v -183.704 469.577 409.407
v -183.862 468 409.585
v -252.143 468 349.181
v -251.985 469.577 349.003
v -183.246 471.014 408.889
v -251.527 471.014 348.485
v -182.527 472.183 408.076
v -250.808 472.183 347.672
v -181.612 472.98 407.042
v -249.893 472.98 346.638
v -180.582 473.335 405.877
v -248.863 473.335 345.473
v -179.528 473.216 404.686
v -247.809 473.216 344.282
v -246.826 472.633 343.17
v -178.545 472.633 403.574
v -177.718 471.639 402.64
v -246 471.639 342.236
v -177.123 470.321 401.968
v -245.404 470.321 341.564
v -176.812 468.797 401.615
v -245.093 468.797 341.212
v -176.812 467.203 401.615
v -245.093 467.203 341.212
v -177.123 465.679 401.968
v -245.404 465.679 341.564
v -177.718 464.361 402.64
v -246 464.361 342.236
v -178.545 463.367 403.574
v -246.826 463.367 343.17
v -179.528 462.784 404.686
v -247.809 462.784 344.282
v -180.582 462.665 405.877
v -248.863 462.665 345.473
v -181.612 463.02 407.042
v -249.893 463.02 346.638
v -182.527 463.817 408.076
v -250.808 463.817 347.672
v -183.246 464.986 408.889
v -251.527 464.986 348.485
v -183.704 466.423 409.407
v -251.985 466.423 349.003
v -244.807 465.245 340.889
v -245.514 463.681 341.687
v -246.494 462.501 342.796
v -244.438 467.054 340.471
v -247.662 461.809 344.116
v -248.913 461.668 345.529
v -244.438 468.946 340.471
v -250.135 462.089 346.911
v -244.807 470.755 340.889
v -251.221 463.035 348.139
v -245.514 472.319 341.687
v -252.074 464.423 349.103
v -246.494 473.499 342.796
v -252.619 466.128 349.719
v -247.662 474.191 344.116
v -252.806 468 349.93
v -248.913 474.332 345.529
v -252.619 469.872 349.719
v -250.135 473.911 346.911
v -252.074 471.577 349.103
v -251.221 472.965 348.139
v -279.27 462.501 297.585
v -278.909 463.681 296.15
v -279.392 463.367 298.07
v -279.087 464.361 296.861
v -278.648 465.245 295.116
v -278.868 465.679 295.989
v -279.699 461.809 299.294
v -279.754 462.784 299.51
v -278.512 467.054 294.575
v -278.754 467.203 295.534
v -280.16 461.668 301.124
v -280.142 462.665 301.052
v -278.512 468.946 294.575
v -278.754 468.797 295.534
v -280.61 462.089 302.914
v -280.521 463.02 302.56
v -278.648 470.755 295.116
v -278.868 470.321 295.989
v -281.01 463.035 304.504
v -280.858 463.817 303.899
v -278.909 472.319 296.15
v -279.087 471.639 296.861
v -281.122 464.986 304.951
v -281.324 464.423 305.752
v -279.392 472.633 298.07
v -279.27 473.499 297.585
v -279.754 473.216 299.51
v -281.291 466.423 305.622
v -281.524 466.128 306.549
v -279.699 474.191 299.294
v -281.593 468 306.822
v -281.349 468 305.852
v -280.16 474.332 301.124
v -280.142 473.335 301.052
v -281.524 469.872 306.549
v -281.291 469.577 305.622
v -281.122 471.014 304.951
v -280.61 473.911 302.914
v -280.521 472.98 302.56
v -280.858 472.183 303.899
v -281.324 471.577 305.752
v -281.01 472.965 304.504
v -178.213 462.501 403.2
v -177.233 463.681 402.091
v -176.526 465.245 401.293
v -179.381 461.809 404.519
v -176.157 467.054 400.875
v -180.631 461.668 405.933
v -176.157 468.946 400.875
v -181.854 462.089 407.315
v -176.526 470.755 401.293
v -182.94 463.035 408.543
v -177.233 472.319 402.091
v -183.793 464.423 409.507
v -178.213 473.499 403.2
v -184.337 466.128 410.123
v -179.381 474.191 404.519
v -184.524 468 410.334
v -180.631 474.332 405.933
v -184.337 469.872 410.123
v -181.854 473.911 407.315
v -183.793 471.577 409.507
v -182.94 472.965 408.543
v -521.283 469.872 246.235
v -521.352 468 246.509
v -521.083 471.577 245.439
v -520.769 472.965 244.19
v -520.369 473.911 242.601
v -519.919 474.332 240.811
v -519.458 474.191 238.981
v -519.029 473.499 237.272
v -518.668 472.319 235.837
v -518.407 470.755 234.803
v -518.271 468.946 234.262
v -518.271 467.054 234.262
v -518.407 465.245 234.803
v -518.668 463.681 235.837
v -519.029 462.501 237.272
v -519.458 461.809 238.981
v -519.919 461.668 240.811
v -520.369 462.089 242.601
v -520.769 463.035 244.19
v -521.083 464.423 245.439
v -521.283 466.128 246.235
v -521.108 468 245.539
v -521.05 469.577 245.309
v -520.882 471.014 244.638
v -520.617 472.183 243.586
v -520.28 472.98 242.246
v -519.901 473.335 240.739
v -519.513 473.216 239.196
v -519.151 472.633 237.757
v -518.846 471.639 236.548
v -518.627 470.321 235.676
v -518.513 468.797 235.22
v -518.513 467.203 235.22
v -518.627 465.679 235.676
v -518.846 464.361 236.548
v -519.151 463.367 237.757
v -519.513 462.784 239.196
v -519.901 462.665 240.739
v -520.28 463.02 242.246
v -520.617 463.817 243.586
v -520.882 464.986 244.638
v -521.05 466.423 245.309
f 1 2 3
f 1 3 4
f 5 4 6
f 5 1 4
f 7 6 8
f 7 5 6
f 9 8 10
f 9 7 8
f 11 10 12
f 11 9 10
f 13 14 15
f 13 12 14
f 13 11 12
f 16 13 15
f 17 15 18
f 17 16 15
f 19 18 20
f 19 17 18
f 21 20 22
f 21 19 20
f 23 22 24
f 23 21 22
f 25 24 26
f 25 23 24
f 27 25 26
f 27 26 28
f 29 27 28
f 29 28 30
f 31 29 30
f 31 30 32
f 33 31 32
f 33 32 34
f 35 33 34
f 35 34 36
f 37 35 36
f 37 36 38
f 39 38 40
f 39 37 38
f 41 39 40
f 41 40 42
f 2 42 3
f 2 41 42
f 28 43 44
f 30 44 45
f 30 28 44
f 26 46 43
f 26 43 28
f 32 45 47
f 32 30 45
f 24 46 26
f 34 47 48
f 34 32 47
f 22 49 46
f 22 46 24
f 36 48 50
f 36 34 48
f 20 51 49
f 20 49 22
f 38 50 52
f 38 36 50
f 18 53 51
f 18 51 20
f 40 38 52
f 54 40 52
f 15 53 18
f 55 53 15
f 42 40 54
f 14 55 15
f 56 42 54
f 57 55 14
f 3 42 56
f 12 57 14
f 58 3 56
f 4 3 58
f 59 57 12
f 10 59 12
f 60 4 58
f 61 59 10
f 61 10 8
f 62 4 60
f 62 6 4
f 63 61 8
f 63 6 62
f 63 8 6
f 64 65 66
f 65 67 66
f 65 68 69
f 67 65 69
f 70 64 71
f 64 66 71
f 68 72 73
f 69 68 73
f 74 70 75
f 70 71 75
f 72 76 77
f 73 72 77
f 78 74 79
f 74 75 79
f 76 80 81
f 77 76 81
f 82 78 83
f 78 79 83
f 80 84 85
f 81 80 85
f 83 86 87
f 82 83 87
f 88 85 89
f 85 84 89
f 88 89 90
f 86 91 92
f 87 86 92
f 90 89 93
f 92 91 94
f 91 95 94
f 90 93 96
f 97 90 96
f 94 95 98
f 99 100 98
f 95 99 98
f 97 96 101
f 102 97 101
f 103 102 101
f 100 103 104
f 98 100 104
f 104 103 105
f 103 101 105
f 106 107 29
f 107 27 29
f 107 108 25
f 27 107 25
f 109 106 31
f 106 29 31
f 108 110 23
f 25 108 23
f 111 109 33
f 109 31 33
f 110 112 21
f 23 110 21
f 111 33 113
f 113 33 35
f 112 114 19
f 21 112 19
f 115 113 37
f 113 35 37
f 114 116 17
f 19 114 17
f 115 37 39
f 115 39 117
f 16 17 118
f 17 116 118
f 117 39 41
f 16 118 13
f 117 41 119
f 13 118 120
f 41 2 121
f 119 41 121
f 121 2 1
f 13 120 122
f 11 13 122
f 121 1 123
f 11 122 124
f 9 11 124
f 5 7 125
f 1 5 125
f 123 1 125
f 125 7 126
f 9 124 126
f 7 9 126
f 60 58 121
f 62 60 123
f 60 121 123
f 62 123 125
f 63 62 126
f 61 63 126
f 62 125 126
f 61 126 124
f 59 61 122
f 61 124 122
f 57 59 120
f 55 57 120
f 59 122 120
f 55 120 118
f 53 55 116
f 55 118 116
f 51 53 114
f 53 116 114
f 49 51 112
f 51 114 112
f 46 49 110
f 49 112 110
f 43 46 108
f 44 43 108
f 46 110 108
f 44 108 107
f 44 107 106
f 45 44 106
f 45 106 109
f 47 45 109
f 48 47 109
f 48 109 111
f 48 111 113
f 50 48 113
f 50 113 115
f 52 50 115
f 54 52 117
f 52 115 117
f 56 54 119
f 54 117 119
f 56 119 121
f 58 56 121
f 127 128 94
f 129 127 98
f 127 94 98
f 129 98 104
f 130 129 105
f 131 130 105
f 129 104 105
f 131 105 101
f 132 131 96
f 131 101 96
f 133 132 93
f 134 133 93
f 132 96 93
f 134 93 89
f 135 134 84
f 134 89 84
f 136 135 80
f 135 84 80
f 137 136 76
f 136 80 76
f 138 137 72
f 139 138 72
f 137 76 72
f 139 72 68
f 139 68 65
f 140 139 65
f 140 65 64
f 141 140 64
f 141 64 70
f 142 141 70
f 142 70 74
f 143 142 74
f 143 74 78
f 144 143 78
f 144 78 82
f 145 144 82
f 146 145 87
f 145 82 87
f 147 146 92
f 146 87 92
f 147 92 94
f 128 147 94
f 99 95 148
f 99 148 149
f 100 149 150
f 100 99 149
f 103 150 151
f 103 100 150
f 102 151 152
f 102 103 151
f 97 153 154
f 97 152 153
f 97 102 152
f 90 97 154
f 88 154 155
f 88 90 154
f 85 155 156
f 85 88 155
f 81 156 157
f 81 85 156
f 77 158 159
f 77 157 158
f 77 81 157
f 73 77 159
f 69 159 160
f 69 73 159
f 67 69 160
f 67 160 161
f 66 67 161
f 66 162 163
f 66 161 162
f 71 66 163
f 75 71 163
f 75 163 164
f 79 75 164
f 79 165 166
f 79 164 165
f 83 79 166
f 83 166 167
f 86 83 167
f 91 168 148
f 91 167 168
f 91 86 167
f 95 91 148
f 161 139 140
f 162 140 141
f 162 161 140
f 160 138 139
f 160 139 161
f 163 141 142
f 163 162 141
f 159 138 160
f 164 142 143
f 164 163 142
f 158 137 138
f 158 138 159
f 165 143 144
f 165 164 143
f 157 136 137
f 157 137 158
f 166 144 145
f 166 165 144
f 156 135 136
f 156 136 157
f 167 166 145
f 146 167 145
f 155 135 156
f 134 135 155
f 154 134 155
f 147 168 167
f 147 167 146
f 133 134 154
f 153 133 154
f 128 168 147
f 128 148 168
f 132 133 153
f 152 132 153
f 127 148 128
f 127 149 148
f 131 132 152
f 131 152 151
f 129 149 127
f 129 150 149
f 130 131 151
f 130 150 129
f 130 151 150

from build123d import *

# Parameters (mm, degrees)
SZKIC1_R                    = 6.349999996
DODANIE_WYCI_GNI_CIE1_DEPTH = 91.164431394
SZKIC2_R                    = 6.349999998
DODANIE_WYCI_GNI_CIE2_DEPTH = 247.228842592
SKORUPA1_T                  = -1
SKORUPA2_T                  = -1


with BuildPart() as part:
    # Szkic1 → Dodanie-wyciągnięcie1 (new body)
    with BuildSketch(Plane(origin=(100.119816365, 0, 88.569559312), x_dir=(-0.6625823992959091, 0, 0.7489890280526655), z_dir=(-0.7489890280526655, 0, -0.6625823992959091))):
        with Locations((423.248159606, 467.999999999)):
            Circle(SZKIC1_R)
    extrude(amount=DODANIE_WYCI_GNI_CIE1_DEPTH)

    # Skorupa2
    skorupa2_openings = [part.faces().sort_by_distance(p)[0] for p in [
        (-180.316964724, 467.999999999, 405.577787),
        (-248.598123587, 467.999999999, 345.173839317),
    ]]
    offset(amount=SKORUPA2_T, openings=skorupa2_openings, kind=Kind.INTERSECTION)


with BuildPart() as body_2:
    # Szkic2 → Dodanie-wyciągnięcie2 (new body)
    with BuildSketch(Plane(origin=(-192.244416892, 1e-09, -48.36049147), x_dir=(-0.2439567983035096, 0, 0.9697861004167365), z_dir=(-0.9697861004167366, 6.6607780708785495e-12, -0.24395679830350964))):
        with Locations((359.898466208, 467.999999999)):
            Circle(SZKIC2_R)
    extrude(amount=DODANIE_WYCI_GNI_CIE2_DEPTH)

    # Skorupa1
    skorupa1_openings = [body_2.faces().sort_by_distance(p)[0] for p in [
        (-280.044094419, 468.000000001, 300.664038621),
        (-519.803189587, 468.000000002, 240.350881734),
    ]]
    offset(amount=SKORUPA1_T, openings=skorupa1_openings, kind=Kind.INTERSECTION)


solid = Compound([part.part, body_2.part])
